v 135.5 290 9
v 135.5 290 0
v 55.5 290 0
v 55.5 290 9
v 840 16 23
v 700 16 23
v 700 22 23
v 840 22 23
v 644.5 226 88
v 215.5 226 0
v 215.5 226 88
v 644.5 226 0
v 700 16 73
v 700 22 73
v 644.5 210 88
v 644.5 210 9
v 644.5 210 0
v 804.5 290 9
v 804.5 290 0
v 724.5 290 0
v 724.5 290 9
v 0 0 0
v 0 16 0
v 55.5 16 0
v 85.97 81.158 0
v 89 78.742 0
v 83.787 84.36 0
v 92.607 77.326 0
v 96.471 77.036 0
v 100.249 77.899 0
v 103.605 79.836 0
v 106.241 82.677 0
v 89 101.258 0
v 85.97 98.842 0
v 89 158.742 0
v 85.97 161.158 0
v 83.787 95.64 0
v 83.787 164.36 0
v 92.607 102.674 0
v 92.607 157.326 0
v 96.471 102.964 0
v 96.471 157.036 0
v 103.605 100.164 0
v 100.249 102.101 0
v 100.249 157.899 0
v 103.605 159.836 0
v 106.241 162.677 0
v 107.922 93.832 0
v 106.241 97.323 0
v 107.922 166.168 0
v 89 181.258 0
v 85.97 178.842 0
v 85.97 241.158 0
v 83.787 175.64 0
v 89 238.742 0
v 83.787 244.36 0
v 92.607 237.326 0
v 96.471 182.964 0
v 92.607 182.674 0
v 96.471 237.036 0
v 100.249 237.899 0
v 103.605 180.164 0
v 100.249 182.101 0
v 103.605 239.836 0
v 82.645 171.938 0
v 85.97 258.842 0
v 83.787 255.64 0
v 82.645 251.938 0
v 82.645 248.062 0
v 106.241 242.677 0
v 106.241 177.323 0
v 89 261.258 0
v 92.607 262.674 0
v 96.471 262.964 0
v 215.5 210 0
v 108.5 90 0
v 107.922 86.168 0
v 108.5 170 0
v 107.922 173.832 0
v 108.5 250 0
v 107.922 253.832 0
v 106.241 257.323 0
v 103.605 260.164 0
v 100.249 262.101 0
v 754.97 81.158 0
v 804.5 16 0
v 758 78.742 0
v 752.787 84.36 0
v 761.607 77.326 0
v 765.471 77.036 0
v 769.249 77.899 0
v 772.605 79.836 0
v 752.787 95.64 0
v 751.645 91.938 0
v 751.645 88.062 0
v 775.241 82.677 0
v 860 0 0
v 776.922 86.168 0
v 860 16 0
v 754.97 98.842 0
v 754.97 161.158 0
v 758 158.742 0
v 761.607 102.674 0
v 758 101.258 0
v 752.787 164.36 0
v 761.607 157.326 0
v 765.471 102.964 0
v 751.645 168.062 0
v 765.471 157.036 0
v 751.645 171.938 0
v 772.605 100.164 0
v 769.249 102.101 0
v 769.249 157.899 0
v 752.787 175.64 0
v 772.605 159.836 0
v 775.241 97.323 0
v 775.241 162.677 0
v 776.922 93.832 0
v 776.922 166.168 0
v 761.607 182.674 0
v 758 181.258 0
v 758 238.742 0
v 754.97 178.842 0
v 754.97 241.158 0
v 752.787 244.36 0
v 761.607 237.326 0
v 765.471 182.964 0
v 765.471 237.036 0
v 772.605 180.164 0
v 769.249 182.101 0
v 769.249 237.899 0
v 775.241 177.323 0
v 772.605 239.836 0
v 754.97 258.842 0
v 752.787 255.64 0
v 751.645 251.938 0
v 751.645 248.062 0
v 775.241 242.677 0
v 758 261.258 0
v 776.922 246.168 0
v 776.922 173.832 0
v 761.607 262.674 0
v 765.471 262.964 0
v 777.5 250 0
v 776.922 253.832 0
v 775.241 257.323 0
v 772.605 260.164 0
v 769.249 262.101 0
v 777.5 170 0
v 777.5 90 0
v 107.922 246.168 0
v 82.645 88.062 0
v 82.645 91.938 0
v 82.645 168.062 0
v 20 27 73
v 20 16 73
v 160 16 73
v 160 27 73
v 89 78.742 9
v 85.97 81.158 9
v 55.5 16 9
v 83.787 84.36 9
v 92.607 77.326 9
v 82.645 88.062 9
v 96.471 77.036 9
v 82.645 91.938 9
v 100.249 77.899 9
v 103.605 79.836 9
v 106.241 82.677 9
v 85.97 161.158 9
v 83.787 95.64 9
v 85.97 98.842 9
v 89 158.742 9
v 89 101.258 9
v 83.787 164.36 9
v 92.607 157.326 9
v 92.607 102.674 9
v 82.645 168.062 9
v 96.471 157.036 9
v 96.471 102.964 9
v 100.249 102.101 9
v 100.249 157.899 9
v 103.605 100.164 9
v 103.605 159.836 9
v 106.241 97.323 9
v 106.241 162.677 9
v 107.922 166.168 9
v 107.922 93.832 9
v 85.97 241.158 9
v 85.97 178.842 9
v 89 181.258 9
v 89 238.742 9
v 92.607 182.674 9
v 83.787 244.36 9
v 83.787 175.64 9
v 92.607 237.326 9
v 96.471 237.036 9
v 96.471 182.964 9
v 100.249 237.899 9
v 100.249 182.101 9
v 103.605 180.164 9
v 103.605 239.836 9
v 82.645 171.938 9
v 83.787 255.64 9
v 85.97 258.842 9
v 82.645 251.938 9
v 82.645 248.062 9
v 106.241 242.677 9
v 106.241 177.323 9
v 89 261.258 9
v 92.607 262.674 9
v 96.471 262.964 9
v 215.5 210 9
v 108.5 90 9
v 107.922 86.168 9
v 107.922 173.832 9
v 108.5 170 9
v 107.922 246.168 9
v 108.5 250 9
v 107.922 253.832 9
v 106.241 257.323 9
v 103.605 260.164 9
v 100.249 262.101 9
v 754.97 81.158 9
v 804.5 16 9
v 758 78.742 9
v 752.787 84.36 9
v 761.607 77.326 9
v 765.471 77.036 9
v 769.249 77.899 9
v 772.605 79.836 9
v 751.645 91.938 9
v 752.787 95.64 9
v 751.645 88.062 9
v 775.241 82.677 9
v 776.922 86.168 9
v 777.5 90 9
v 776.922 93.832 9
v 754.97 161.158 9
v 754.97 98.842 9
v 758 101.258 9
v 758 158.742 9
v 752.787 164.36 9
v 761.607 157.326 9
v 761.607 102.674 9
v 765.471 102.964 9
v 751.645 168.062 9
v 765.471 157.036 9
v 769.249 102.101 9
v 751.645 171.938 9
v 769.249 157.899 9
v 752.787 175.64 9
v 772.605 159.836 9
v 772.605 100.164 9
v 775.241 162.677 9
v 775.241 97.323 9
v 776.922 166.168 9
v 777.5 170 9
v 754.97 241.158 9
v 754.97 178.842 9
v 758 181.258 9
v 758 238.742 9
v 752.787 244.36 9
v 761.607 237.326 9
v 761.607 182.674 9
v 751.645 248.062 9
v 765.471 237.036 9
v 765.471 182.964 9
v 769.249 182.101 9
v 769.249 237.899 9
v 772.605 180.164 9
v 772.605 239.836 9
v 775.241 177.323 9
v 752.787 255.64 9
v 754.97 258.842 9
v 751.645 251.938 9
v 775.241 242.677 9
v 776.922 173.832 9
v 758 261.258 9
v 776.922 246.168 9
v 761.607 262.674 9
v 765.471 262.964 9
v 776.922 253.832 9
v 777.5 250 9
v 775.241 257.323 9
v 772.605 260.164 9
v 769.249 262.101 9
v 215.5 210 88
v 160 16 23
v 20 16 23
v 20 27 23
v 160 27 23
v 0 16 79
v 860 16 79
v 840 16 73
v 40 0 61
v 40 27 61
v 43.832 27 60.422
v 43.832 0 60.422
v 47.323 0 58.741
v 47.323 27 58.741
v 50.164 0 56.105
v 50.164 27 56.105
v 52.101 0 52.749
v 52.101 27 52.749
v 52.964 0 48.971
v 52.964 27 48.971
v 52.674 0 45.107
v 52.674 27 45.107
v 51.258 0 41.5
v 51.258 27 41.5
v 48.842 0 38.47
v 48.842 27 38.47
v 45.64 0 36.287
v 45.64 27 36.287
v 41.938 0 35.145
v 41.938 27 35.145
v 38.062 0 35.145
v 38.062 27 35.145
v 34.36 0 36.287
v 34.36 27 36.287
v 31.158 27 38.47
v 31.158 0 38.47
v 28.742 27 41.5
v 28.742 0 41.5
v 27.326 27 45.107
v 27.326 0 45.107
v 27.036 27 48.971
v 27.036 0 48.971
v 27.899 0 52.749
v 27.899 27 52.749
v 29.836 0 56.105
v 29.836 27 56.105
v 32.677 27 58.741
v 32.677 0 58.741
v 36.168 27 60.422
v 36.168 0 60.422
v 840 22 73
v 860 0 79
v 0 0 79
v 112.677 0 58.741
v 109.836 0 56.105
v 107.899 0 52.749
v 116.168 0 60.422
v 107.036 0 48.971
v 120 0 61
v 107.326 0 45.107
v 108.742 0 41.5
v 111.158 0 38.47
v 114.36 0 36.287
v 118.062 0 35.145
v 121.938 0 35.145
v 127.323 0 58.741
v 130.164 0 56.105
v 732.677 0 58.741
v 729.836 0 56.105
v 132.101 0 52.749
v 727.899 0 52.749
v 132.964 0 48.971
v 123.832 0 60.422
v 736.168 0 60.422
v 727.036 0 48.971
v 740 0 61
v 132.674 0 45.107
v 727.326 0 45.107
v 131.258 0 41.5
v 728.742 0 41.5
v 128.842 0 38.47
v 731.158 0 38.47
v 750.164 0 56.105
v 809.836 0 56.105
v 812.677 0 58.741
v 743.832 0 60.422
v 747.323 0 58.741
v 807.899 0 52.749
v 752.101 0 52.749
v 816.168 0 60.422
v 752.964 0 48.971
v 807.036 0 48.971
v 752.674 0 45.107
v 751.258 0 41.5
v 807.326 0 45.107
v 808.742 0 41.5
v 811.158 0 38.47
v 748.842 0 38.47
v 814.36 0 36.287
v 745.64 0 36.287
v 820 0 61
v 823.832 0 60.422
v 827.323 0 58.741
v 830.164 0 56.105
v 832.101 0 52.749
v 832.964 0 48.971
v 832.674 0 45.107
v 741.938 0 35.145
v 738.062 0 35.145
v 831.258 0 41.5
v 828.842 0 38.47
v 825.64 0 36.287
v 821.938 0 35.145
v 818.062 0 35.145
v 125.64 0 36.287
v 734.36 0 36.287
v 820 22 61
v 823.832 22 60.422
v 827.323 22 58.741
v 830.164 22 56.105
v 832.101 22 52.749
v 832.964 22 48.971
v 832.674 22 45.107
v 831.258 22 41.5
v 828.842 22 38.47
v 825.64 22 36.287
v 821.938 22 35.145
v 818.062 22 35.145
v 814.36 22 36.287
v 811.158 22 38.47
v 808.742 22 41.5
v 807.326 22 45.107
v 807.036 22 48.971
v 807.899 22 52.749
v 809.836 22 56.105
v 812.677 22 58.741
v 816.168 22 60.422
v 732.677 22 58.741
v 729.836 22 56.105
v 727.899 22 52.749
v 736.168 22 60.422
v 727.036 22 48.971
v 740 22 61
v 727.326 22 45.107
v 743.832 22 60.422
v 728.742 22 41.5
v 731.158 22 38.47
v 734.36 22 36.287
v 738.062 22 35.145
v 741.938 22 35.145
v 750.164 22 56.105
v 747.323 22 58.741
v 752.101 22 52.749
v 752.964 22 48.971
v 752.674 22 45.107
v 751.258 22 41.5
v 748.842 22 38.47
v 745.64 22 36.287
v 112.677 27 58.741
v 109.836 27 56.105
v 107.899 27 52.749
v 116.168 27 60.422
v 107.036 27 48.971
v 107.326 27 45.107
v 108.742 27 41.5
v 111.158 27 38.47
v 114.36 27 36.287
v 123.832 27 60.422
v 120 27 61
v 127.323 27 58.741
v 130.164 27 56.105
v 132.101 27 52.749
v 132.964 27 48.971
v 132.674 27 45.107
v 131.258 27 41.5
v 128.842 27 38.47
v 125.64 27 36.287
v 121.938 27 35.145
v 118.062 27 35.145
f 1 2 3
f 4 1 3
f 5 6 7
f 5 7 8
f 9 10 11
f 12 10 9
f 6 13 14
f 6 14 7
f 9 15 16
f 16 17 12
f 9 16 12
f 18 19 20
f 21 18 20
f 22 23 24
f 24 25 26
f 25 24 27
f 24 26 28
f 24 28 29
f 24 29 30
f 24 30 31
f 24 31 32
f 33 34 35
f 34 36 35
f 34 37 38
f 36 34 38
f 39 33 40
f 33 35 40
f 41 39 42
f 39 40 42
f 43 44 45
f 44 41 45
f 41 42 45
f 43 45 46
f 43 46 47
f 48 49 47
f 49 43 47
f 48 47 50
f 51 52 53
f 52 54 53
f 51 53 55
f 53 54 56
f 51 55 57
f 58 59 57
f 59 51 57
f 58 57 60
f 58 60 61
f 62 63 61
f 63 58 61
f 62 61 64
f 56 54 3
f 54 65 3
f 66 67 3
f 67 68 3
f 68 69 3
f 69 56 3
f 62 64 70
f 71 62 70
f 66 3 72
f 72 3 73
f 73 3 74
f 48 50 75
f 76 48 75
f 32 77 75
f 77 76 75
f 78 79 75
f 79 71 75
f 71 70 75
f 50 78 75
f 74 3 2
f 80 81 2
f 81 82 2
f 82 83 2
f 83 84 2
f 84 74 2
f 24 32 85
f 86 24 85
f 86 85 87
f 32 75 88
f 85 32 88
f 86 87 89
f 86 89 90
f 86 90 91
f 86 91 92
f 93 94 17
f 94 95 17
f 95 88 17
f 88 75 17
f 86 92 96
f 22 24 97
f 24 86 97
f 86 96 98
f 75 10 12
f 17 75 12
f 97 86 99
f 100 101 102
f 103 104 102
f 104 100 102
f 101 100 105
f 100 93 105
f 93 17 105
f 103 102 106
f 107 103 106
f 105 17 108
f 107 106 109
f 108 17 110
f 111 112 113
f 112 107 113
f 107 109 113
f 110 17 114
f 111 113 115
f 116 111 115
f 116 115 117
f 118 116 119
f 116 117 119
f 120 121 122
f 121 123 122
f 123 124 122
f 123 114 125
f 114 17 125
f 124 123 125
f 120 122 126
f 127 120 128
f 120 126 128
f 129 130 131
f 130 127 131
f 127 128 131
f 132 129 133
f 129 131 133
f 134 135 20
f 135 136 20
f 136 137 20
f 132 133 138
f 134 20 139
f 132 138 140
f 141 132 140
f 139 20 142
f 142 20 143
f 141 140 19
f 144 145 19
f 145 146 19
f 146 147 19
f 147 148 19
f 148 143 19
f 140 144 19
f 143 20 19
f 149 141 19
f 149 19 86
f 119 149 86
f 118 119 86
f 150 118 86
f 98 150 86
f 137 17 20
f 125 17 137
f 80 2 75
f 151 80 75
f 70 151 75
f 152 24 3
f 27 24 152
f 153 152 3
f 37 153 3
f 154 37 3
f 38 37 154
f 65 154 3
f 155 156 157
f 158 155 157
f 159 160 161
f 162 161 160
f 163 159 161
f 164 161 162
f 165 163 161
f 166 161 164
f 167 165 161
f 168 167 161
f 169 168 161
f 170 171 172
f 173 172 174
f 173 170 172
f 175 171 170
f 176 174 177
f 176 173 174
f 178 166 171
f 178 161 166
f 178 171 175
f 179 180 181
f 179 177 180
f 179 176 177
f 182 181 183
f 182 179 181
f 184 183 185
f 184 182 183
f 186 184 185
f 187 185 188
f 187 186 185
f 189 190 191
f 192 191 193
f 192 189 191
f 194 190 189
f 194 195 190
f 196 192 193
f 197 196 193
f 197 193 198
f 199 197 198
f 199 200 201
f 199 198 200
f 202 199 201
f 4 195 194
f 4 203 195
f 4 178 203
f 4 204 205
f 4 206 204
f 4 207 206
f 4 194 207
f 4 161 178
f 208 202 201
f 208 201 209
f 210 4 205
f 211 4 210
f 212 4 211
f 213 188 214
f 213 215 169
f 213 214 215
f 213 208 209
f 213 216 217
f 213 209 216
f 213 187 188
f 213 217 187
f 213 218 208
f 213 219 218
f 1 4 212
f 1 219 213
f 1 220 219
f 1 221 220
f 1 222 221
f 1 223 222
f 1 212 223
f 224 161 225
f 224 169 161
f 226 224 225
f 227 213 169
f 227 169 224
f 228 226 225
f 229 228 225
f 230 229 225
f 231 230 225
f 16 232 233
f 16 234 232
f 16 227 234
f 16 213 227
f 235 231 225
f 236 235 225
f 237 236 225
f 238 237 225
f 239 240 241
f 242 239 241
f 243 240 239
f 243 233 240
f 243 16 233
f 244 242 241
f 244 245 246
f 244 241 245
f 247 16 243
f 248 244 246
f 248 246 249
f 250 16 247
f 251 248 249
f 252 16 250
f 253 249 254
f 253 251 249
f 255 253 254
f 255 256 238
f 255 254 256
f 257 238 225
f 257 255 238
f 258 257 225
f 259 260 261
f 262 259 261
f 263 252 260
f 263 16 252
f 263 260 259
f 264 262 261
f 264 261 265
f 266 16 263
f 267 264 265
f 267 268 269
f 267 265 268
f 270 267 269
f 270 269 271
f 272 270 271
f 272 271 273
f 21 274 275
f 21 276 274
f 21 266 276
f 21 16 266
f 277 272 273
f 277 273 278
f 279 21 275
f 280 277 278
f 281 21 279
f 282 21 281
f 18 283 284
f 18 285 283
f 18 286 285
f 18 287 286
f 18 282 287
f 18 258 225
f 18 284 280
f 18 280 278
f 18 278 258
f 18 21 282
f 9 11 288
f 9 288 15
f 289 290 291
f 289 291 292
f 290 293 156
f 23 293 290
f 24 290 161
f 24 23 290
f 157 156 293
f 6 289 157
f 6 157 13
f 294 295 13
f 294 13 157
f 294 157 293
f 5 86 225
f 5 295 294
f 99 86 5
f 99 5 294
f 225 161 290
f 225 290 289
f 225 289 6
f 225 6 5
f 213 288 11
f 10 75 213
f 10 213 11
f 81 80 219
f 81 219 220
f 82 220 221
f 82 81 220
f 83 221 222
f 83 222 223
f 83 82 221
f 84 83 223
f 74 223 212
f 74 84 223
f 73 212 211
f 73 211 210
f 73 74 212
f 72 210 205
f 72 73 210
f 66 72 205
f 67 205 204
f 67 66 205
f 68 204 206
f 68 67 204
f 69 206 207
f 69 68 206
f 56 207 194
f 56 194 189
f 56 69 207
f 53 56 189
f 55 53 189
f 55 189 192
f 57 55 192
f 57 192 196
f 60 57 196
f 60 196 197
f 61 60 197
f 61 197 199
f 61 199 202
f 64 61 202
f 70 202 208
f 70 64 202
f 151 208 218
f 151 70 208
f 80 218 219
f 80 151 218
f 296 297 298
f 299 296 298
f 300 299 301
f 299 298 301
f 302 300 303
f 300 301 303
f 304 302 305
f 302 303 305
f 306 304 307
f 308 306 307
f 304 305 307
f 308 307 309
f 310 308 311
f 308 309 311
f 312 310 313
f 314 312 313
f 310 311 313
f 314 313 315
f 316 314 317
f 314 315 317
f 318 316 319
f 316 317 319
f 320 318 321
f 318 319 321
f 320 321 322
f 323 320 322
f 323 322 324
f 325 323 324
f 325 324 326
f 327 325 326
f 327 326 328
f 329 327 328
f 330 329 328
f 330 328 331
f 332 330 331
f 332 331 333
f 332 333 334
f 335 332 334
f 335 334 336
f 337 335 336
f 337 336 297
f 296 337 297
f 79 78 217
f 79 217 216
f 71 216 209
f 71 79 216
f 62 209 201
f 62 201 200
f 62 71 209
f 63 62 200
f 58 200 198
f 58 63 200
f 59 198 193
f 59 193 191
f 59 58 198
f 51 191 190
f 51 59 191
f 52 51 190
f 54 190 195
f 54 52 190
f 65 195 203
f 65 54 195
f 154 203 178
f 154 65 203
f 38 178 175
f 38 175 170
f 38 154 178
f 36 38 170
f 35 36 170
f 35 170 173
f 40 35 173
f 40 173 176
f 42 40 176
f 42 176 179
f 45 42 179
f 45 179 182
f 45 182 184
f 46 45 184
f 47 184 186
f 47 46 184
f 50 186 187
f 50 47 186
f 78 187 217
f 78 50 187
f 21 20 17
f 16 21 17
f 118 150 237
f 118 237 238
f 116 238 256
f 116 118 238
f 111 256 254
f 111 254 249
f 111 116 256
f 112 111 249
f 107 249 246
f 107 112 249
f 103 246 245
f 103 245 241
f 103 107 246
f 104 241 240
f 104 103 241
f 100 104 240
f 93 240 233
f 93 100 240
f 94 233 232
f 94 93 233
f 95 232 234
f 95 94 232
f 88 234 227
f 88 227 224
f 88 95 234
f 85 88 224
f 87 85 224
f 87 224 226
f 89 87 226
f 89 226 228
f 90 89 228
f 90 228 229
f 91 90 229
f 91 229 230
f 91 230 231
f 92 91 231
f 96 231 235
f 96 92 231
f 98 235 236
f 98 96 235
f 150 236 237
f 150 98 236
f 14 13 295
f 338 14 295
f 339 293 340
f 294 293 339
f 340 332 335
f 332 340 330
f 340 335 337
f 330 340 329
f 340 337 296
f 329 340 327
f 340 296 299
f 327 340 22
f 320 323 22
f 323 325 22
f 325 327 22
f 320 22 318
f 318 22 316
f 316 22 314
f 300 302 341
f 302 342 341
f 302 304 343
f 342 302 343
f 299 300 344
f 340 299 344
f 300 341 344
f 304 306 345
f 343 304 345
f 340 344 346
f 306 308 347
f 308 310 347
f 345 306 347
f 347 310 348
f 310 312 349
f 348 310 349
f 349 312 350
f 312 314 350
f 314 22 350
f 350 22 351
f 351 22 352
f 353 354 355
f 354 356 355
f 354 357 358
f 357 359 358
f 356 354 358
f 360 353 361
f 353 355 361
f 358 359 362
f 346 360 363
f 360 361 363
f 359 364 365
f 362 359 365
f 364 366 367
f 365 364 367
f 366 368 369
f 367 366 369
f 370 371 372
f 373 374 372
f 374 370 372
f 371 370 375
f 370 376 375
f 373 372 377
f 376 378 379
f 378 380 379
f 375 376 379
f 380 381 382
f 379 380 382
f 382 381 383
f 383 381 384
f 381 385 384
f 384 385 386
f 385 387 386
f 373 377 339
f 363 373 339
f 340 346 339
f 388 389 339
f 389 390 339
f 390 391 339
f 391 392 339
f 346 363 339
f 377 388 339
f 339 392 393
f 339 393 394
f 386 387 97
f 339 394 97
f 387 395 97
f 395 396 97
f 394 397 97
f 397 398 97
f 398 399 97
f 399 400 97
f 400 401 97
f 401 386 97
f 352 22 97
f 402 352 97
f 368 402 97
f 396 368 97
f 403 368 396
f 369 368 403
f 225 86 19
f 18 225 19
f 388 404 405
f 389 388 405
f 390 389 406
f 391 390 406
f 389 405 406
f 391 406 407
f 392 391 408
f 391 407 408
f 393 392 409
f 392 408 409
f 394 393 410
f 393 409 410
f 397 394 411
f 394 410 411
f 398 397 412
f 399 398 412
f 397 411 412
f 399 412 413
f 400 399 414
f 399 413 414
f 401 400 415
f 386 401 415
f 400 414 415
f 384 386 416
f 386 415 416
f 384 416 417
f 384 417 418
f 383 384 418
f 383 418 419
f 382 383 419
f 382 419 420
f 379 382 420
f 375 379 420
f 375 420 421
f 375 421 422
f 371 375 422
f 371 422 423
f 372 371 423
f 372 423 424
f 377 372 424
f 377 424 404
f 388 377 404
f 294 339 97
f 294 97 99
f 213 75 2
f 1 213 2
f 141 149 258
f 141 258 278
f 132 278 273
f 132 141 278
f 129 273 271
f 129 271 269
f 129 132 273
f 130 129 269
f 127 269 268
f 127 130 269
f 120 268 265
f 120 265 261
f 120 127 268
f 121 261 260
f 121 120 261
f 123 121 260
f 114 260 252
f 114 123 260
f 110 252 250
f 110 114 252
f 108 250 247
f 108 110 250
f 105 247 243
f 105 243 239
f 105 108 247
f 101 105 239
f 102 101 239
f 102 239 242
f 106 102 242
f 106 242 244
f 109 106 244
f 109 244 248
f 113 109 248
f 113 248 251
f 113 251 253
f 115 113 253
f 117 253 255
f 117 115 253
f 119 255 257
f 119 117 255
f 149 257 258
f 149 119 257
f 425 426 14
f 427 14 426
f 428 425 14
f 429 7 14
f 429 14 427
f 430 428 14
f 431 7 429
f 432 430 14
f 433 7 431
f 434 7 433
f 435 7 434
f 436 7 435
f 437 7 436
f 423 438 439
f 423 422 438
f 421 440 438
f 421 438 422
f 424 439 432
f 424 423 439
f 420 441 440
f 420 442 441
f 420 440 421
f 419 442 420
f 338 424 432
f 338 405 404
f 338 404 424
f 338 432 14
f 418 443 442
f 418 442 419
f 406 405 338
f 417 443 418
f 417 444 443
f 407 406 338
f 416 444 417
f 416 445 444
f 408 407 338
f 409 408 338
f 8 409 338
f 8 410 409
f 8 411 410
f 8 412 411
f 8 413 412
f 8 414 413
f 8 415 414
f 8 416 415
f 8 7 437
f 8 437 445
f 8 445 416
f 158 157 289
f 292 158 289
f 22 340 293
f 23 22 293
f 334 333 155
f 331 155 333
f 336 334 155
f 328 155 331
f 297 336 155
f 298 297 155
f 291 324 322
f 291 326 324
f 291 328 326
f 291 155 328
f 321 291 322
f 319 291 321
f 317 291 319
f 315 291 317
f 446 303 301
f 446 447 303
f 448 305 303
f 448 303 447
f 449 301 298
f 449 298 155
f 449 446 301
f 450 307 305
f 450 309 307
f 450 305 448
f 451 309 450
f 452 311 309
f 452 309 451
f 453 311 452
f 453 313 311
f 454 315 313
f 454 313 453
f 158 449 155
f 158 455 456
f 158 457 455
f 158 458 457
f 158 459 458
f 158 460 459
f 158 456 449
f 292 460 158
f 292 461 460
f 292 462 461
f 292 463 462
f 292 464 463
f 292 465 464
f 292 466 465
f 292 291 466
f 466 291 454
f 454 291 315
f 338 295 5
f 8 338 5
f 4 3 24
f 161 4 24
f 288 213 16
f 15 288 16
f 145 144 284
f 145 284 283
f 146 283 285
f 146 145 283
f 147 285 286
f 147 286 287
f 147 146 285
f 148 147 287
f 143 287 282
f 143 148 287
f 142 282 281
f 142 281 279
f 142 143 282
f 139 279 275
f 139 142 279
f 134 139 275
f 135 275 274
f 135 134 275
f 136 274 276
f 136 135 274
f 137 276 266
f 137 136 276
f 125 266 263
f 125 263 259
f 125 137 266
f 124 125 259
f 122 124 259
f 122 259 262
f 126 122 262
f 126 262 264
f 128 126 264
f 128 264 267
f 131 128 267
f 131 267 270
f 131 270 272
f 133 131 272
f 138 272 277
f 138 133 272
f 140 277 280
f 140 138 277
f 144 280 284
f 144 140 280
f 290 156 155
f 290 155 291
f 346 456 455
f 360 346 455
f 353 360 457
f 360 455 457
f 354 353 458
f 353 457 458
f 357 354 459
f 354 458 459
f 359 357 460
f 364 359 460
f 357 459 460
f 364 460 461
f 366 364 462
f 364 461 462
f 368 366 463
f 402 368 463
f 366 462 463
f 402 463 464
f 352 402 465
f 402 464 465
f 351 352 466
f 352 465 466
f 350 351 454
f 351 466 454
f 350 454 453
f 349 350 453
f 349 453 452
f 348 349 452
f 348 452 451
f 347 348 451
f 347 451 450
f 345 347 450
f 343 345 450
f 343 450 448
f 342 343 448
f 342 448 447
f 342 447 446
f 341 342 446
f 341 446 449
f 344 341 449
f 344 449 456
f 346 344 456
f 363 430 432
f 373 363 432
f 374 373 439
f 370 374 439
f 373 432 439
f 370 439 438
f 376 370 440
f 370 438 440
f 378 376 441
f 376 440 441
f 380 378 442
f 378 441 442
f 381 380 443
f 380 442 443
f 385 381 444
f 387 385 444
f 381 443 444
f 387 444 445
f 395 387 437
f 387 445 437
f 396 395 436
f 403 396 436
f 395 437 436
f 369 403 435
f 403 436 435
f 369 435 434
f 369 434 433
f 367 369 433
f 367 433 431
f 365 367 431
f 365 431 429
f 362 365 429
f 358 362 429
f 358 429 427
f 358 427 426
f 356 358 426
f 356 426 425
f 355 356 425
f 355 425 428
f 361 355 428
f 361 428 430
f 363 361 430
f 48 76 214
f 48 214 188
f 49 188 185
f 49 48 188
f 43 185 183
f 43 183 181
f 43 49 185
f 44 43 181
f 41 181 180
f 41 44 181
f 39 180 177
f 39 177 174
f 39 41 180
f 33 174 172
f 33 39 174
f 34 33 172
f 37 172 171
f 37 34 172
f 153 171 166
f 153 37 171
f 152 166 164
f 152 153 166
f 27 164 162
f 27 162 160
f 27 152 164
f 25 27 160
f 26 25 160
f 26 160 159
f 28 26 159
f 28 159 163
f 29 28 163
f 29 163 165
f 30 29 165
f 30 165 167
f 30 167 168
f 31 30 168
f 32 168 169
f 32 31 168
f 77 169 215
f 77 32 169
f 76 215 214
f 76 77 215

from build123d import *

# Parameters (mm, degrees)
SKETCH_1_R             = 13
EXTRUDE_2_DEPTH        = 9
SKETCH_3_W             = 860
SKETCH_3_H             = 16
EXTRUDE_3_DEPTH        = 70
SKETCH_4_W             = 140
SKETCH_4_H             = 50
EXTRUDE_5_DEPTH        = 11
SKETCH_5_R             = 13
CUT_EXTRUDE_2_DEPTH    = 903.779042734
PATTERN_LINEAR_1_COUNT = 2
PATTERN_LINEAR_1_PITCH = 80
SKETCH_6_W             = 140
SKETCH_6_H             = 50
EXTRUDE_6_DEPTH        = 6
SKETCH_7_R             = 13
CUT_EXTRUDE_3_DEPTH    = 905.248306606
PATTERN_LINEAR_2_COUNT = 2
PATTERN_LINEAR_2_PITCH = 80
SKETCH_10_W            = 429
SKETCH_10_H            = 16
EXTRUDE_8_DEPTH        = 79


with BuildPart() as part:
    # 草图1 → 凸台-拉伸2 (new body)
    with BuildSketch(Plane.XY):
        Polygon((0, 0), (860, 0), (860, 16), (804.5, 16), (804.5, 290), (724.5, 290), (644.5, 210), (644.5, 226), (215.5, 226), (215.5, 210), (135.5, 290), (55.5, 290), (55.5, 16), (0, 16), align=None)
        with Locations((95.5, 90)):
            Circle(SKETCH_1_R, mode=Mode.SUBTRACT)
        with Locations((95.5, 170)):
            Circle(SKETCH_1_R, mode=Mode.SUBTRACT)
        with Locations((95.5, 250)):
            Circle(SKETCH_1_R, mode=Mode.SUBTRACT)
        with Locations((764.5, 90)):
            Circle(SKETCH_1_R, mode=Mode.SUBTRACT)
        with Locations((764.5, 170)):
            Circle(SKETCH_1_R, mode=Mode.SUBTRACT)
        with Locations((764.5, 250)):
            Circle(SKETCH_1_R, mode=Mode.SUBTRACT)
    extrude(amount=EXTRUDE_2_DEPTH)

    # 草图3 → 凸台-拉伸3 (add)
    with BuildSketch(Plane.XY.offset(9)):
        with Locations((430, 8)):
            Rectangle(SKETCH_3_W, SKETCH_3_H)
    extrude(amount=EXTRUDE_3_DEPTH)

    # 草图4 → 凸台-拉伸5 (add)
    with BuildSketch(Plane(origin=(0, 16, 0), x_dir=(1, 0, 0), z_dir=(0, 1, 0))):
        with Locations((90, -48)):
            Rectangle(SKETCH_4_W, SKETCH_4_H)
    extrude(amount=EXTRUDE_5_DEPTH)

    # 草图5 → 切除-拉伸2 (cut, through all)
    with BuildSketch(Plane(origin=(0, 27, 0), x_dir=(1, 0, 0), z_dir=(0, 1, 0))):
        with Locations(Location((40, -48, 0), (0, 0, 270))):
            Circle(SKETCH_5_R)
    cut_extrude_2 = extrude(amount=-CUT_EXTRUDE_2_DEPTH, mode=Mode.SUBTRACT)

    # 阵列(线性)1: 切除-拉伸2 ×2
    with Locations(*[(i * PATTERN_LINEAR_1_PITCH, 0, 0) for i in range(1, PATTERN_LINEAR_1_COUNT)]):
        add(cut_extrude_2, mode=Mode.SUBTRACT)

    # 草图6 → 凸台-拉伸6 (add)
    with BuildSketch(Plane(origin=(0, 16, 0), x_dir=(1, 0, 0), z_dir=(0, 1, 0))):
        with Locations((770, -48)):
            Rectangle(SKETCH_6_W, SKETCH_6_H)
    extrude(amount=EXTRUDE_6_DEPTH)

    # 草图7 → 切除-拉伸3 (cut, through all)
    with BuildSketch(Plane(origin=(0, 22, 0), x_dir=(1, 0, 0), z_dir=(0, 1, 0))):
        with Locations(Location((820, -48, 0), (0, 0, 270))):
            Circle(SKETCH_7_R)
    cut_extrude_3 = extrude(amount=-CUT_EXTRUDE_3_DEPTH, mode=Mode.SUBTRACT)

    # 阵列(线性)2: 切除-拉伸3 ×2
    with Locations(*[(-i * PATTERN_LINEAR_2_PITCH, 0, 0) for i in range(1, PATTERN_LINEAR_2_COUNT)]):
        add(cut_extrude_3, mode=Mode.SUBTRACT)

    # 草图10 → 凸台-拉伸8 (add)
    with BuildSketch(Plane.XY.offset(9)):
        with Locations((430, 218)):
            Rectangle(SKETCH_10_W, SKETCH_10_H)
    extrude(amount=EXTRUDE_8_DEPTH)


solid = part.part
